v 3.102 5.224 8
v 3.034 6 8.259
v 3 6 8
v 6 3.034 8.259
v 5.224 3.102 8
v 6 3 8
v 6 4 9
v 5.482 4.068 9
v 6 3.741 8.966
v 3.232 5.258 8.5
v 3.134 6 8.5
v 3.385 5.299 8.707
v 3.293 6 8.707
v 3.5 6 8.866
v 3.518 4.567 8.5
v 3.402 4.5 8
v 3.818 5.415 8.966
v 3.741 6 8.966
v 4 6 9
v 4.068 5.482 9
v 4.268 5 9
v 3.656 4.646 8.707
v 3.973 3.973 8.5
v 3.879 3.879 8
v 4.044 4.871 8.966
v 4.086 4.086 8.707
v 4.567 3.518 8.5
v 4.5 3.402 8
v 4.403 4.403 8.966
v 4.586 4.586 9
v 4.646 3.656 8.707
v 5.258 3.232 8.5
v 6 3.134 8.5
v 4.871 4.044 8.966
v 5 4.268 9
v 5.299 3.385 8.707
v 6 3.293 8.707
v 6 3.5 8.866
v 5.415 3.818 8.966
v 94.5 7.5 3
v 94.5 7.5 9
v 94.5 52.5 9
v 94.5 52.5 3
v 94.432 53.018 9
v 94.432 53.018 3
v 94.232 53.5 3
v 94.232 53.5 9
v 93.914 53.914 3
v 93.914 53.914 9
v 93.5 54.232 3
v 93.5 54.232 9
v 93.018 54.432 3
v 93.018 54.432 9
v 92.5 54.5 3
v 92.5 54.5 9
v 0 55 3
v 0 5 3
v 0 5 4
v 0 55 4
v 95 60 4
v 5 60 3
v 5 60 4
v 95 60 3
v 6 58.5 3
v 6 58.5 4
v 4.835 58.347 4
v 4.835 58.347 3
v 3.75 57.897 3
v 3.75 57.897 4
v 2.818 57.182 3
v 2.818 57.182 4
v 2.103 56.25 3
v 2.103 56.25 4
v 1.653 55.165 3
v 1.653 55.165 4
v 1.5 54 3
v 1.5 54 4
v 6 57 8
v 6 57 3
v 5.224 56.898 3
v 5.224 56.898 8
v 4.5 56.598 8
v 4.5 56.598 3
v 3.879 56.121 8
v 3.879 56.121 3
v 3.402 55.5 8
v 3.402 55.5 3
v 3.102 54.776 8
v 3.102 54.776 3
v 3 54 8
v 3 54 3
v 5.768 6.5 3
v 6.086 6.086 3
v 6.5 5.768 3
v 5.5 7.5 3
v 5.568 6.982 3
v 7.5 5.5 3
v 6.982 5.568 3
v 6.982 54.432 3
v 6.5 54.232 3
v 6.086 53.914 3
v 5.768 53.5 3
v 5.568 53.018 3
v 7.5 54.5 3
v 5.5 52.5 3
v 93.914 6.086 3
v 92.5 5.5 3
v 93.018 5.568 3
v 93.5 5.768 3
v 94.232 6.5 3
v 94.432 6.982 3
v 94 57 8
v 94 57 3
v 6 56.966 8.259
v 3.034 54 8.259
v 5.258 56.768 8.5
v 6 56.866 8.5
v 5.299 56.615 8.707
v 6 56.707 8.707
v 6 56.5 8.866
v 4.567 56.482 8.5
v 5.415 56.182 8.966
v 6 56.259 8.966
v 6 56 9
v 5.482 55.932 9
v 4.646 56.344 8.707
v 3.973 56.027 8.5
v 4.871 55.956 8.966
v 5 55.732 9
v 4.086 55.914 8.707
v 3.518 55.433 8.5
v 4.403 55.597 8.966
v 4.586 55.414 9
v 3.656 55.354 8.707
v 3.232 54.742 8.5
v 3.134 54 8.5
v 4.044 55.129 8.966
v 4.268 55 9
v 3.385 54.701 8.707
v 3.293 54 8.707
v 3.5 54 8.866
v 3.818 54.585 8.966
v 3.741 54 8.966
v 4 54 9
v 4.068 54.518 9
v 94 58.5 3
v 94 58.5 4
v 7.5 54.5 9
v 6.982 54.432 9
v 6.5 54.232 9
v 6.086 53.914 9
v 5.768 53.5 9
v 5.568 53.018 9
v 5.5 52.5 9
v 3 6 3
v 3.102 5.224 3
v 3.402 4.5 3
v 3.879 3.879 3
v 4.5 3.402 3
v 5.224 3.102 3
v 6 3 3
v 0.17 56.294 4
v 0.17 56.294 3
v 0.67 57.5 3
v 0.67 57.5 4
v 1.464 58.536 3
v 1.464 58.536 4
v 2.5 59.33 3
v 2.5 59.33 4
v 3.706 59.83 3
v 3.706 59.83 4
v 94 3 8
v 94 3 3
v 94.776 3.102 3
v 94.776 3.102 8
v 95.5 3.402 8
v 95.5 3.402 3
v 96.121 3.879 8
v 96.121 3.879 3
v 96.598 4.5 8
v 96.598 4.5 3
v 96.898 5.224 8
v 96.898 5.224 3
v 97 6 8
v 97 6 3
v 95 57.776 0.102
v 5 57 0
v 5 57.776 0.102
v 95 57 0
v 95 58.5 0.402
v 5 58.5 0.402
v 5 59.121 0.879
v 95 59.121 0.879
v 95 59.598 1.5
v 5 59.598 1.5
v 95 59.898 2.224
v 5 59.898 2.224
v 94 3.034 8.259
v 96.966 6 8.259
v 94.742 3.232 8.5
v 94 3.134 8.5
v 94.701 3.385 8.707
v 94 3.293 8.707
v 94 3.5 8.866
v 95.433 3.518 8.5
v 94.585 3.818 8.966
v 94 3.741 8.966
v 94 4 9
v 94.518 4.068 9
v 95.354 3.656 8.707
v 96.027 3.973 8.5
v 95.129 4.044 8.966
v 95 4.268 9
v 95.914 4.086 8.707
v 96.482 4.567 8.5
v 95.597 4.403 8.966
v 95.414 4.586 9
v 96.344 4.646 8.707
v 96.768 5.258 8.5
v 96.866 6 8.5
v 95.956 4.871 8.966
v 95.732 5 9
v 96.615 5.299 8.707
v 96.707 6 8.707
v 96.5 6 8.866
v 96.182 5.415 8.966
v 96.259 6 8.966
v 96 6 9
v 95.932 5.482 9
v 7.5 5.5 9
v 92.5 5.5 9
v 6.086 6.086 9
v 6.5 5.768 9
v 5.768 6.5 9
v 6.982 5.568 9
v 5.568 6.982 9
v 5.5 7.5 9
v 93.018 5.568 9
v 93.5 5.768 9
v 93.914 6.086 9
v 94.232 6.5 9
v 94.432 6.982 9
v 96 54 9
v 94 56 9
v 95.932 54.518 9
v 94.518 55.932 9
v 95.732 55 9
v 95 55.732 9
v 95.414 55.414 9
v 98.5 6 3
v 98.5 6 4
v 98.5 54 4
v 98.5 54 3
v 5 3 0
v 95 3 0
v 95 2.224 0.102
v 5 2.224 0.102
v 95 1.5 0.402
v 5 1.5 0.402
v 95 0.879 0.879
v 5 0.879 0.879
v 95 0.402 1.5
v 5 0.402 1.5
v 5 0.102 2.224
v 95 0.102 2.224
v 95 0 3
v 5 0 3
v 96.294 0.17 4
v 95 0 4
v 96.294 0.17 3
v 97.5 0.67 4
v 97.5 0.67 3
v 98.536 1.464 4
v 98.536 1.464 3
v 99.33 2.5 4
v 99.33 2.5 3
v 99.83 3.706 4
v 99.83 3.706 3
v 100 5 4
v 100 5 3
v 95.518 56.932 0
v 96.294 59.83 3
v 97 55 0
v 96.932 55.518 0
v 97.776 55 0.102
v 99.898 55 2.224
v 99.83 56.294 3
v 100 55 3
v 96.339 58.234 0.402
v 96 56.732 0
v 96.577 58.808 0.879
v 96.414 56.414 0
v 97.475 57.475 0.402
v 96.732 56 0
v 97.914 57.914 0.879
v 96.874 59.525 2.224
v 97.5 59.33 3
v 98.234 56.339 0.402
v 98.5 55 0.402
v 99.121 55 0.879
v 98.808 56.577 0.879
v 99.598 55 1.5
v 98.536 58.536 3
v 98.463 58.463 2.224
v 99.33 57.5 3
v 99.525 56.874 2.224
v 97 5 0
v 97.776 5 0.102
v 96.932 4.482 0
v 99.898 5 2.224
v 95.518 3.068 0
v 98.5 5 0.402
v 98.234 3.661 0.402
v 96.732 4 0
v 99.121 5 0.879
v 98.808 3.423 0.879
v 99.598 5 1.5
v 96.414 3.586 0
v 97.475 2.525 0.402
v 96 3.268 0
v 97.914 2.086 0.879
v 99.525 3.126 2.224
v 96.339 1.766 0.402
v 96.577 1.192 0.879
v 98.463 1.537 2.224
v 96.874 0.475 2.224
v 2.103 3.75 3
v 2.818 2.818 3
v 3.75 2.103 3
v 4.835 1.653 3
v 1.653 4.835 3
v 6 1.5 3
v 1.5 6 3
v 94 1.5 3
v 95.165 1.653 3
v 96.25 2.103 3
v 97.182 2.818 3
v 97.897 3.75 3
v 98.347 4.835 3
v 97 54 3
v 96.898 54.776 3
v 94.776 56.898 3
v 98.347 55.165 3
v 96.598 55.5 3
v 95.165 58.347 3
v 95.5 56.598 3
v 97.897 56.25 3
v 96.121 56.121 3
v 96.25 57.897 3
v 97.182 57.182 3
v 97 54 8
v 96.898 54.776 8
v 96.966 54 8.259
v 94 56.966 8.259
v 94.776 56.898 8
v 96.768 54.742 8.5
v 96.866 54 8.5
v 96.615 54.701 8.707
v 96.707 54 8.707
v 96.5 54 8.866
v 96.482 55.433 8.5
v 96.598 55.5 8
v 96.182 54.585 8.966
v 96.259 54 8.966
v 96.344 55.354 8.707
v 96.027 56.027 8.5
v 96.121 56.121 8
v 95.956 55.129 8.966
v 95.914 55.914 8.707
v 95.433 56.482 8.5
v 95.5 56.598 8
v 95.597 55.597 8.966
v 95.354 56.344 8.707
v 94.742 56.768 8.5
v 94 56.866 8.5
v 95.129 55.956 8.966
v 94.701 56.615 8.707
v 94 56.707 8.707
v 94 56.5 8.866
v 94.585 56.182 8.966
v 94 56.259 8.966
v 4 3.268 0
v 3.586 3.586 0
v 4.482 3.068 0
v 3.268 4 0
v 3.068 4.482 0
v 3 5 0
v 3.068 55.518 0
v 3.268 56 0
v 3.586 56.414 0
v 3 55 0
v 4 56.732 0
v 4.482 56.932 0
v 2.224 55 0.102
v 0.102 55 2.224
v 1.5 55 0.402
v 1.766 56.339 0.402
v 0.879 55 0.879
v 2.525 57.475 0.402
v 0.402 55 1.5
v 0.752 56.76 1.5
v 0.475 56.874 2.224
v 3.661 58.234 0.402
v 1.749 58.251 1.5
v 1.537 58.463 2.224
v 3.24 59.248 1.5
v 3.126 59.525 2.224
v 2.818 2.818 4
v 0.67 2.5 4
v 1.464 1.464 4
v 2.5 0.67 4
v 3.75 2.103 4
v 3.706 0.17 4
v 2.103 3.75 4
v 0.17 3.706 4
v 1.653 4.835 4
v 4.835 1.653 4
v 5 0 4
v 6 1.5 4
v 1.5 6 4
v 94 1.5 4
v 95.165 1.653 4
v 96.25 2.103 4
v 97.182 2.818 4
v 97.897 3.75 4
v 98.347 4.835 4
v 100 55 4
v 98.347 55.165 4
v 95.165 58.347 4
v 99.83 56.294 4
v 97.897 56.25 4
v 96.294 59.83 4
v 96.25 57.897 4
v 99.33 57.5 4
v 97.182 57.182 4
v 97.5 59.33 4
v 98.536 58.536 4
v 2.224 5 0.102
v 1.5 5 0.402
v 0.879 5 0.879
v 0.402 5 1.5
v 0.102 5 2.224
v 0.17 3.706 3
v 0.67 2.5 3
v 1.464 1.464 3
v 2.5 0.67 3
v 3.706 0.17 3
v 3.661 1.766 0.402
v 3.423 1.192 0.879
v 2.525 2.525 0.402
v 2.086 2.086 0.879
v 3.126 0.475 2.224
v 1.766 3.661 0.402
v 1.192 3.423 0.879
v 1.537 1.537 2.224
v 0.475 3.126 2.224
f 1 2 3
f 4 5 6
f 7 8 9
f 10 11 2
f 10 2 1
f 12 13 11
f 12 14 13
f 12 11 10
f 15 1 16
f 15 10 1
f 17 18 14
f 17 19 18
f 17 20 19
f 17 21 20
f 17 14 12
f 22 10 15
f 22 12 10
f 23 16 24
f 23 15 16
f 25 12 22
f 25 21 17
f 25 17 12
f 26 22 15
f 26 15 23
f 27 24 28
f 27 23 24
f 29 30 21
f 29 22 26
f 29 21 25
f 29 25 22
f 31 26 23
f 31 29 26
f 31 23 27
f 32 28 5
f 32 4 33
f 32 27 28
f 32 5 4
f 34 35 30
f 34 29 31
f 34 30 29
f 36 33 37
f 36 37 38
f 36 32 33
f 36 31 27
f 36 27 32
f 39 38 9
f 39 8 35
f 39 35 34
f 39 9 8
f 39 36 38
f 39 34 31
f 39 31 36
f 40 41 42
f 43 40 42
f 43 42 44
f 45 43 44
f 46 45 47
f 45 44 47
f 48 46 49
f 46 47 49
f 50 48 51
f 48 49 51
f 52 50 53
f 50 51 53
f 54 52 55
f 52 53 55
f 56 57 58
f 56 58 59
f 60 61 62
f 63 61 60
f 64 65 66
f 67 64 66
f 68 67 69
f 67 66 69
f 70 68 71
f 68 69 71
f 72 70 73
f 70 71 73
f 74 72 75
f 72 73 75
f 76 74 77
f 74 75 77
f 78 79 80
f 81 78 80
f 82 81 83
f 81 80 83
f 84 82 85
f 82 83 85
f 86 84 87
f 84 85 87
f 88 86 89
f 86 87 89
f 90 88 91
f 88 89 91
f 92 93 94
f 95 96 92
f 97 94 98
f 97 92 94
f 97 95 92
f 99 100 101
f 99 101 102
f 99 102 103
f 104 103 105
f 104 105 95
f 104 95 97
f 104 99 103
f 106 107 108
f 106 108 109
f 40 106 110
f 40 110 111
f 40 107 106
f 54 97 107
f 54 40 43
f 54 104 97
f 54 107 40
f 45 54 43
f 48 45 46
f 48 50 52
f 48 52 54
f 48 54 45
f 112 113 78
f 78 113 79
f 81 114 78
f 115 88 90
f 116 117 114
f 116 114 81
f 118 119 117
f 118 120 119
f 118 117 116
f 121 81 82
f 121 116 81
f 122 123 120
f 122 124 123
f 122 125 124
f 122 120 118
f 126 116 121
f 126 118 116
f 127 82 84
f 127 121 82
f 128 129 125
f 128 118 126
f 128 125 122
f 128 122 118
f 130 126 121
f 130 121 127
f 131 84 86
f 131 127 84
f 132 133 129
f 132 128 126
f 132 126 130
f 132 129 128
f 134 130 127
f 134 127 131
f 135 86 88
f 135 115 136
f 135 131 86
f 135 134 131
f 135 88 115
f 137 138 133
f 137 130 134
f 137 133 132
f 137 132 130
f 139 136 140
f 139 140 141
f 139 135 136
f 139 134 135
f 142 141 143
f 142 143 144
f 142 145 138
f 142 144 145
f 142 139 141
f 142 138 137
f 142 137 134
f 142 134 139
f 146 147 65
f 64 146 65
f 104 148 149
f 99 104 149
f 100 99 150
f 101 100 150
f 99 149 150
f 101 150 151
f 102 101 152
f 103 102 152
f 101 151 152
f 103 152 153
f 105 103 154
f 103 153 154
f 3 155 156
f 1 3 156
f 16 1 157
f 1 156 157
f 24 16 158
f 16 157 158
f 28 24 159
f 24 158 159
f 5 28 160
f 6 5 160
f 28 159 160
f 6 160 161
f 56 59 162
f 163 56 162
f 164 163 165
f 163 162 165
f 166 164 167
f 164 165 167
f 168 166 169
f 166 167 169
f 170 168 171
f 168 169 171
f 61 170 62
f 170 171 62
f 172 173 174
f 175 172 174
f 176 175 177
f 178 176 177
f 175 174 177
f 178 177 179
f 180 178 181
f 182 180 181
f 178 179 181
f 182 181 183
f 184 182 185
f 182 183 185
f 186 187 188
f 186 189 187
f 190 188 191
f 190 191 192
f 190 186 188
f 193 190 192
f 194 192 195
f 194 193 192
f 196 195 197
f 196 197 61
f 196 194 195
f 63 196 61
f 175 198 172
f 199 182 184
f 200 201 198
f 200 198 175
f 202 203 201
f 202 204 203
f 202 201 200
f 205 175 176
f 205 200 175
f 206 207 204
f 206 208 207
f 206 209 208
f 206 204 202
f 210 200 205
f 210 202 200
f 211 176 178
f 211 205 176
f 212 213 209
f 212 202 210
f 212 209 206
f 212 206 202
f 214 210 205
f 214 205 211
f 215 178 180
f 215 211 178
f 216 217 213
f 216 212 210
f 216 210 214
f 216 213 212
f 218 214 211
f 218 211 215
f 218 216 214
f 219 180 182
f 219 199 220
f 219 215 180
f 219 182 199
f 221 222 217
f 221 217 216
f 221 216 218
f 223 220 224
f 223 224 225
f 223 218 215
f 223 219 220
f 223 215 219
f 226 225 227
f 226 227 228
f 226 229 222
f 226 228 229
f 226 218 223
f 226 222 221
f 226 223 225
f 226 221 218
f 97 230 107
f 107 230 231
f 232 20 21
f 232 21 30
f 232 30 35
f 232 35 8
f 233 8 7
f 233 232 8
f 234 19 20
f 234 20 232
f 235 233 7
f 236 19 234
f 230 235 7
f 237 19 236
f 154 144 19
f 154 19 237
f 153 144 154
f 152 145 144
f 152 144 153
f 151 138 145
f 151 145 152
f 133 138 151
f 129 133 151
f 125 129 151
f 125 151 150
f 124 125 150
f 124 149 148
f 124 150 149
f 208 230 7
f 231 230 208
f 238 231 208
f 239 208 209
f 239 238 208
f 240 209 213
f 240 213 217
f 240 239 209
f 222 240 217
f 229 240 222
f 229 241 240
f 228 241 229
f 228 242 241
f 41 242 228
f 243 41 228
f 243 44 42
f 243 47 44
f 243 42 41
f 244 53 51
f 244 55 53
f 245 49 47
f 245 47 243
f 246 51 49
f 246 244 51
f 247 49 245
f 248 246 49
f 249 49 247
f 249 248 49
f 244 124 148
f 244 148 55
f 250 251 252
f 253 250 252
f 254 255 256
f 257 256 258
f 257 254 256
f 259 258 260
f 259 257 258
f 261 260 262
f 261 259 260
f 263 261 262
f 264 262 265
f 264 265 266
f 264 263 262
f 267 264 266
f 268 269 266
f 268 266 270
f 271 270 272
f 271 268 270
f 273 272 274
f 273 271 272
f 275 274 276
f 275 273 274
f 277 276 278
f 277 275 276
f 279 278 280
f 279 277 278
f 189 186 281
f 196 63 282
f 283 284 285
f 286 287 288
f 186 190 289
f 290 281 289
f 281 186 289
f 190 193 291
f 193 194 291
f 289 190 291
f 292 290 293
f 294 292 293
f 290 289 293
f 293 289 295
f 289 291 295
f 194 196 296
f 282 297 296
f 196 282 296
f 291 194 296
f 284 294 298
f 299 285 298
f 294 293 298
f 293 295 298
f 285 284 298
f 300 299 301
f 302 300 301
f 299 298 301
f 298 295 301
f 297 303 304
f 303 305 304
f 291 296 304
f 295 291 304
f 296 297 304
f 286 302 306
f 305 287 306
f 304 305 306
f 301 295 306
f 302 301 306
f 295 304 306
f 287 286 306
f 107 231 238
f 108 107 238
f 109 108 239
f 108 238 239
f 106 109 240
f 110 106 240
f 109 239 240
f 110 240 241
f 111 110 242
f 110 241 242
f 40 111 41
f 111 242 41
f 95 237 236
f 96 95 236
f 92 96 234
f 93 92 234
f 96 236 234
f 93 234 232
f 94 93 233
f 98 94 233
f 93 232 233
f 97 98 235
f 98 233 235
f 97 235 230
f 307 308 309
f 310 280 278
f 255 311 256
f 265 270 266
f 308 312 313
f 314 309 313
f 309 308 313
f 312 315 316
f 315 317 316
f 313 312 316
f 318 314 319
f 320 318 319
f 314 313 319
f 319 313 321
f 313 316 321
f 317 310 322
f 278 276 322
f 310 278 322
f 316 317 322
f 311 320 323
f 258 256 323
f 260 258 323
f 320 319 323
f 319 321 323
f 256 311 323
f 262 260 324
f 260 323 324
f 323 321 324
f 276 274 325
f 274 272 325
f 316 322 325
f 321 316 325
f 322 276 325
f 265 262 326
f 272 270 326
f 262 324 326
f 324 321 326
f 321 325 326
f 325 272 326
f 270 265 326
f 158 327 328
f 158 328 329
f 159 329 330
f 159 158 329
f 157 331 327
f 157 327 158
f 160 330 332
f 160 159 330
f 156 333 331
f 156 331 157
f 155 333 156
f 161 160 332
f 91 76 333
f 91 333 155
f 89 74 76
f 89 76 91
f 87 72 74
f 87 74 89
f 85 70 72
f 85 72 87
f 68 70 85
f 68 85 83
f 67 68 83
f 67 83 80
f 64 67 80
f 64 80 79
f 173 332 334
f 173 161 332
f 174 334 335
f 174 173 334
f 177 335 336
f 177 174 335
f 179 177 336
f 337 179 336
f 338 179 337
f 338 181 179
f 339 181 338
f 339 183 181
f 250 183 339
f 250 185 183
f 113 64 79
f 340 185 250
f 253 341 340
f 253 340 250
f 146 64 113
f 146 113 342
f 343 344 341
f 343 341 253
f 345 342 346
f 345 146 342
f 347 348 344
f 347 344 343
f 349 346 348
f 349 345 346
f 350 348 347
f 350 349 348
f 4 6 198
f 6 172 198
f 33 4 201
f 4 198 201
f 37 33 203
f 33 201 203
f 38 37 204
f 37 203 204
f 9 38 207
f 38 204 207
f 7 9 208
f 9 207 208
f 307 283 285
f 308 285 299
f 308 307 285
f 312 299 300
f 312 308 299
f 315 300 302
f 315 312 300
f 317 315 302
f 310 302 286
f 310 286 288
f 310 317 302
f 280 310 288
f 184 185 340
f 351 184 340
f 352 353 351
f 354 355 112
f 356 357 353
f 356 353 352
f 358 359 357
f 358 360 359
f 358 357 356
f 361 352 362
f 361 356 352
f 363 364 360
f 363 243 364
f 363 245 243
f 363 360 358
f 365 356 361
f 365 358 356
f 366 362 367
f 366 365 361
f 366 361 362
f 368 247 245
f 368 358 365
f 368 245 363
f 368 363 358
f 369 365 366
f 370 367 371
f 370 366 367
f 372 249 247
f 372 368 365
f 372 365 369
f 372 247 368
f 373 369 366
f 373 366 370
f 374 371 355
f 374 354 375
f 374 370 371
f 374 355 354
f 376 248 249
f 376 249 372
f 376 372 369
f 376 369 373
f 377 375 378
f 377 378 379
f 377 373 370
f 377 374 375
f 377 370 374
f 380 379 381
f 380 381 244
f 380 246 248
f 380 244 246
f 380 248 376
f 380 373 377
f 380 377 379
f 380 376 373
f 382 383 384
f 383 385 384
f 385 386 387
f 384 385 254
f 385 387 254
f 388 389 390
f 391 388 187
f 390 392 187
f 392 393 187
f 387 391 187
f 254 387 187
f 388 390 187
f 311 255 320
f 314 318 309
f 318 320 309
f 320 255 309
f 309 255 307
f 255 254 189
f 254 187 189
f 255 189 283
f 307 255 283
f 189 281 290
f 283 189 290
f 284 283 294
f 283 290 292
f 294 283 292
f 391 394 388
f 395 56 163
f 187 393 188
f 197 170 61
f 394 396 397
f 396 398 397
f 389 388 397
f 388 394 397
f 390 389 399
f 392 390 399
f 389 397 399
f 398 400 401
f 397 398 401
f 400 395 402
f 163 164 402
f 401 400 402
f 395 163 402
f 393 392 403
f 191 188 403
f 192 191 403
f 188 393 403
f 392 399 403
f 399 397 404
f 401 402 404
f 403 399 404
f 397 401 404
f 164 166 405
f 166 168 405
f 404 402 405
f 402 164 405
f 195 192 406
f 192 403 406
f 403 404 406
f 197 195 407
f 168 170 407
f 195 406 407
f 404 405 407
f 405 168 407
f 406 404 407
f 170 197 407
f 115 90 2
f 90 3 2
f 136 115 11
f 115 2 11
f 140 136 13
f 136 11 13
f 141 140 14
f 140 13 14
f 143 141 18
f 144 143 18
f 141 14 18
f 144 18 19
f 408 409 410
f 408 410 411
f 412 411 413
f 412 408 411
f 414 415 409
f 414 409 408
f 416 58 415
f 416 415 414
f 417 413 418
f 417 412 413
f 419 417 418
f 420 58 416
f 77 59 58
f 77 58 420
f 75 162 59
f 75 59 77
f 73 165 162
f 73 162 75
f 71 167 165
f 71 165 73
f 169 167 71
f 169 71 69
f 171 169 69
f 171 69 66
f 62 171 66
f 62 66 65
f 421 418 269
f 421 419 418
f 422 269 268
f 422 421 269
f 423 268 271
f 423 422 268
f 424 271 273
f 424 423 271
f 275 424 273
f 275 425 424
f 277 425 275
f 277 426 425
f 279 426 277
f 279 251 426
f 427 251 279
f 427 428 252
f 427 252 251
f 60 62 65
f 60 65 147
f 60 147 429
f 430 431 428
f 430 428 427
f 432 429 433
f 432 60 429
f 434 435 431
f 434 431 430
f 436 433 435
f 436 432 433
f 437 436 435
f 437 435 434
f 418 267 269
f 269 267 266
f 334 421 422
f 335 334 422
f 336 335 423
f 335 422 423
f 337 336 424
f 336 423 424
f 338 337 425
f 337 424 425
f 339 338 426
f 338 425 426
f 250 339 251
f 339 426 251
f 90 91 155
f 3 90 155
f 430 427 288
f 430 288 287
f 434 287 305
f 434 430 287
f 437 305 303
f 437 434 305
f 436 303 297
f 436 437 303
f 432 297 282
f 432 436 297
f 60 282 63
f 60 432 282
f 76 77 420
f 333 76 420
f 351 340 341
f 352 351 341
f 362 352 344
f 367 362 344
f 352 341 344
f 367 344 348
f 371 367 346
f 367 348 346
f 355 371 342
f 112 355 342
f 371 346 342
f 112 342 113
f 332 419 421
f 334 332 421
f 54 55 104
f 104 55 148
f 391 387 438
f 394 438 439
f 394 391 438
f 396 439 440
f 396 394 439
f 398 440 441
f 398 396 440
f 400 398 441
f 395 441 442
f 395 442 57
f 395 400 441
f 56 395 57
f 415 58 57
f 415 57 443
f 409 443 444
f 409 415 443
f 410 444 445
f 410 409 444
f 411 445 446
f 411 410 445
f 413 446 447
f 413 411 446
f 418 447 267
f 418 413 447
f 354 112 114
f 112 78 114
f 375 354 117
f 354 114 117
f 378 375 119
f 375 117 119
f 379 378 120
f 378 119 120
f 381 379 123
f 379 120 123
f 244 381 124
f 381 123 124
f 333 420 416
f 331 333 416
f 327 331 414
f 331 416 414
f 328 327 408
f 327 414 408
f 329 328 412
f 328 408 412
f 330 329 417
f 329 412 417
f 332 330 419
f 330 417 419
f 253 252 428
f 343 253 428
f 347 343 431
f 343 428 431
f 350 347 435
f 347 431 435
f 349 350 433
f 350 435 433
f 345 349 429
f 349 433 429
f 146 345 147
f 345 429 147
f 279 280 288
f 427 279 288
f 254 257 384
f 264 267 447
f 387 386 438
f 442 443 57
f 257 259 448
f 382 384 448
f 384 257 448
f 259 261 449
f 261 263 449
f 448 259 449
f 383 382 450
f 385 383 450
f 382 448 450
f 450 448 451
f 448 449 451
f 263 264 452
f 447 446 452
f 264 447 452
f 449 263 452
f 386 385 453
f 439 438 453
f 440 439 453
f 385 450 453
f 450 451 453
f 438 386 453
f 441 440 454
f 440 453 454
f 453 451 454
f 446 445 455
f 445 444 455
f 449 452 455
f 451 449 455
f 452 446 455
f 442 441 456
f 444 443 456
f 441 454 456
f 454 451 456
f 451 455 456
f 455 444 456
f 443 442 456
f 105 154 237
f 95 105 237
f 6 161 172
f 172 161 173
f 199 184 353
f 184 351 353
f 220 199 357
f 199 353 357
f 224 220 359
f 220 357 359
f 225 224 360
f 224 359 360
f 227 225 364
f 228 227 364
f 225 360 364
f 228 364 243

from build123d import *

# Parameters (mm, degrees)
SKETCH_W        = 100
SKETCH_H        = 60
PAD_DEPTH       = 4
FILLET_R        = 5
FILLET001_R     = 3
POCKET001_DEPTH = 1
PAD001_DEPTH    = 5
POCKET_DEPTH    = 6
FILLET002_R     = 1


with BuildPart() as part:
    # Sketch → Pad (new body)
    with BuildSketch(Plane.XY):
        with Locations((50, 30)):
            Rectangle(SKETCH_W, SKETCH_H)
    extrude(amount=PAD_DEPTH)

    # Fillet
    fillet_edges = [part.edges().sort_by_distance(p)[0] for p in [
        (100, 0, 2),
        (0, 0, 2),
        (100, 60, 2),
        (0, 60, 2),
    ]]
    fillet(fillet_edges, radius=FILLET_R)

    # Fillet001
    fillet001_edges = [part.edges().sort_by_distance(p)[0] for p in [
        (50, 60, 0),
    ]]
    fillet(fillet001_edges, radius=FILLET001_R)

    # Sketch008 (on Face6 of Pad) → Pocket001 (cut)
    with BuildSketch(Plane.XY.offset(4)):
        with BuildLine():
            Line((6, 1.5), (94, 1.5))
            ThreePointArc((94, 1.5), (97.181981, 2.818019), (98.5, 6))
            Line((98.5, 6), (98.5, 54))
            ThreePointArc((98.5, 54), (97.181981, 57.181981), (94, 58.5))
            Line((94, 58.5), (6, 58.5))
            ThreePointArc((6, 58.5), (2.818019, 57.181981), (1.5, 54))
            Line((1.5, 54), (1.5, 6))
            ThreePointArc((1.5, 6), (2.818019, 2.818019), (6, 1.5))
        make_face()
        with BuildLine():
            Line((6, 3), (94, 3))
            ThreePointArc((94, 3), (96.12132, 3.87868), (97, 6))
            Line((97, 6), (97, 54))
            ThreePointArc((97, 54), (96.12132, 56.12132), (94, 57))
            Line((94, 57), (6, 57))
            ThreePointArc((6, 57), (3.87868, 56.12132), (3, 54))
            Line((3, 54), (3, 6))
            ThreePointArc((3, 6), (3.87868, 3.87868), (6, 3))
        make_face(mode=Mode.SUBTRACT)
    extrude(amount=-POCKET001_DEPTH, mode=Mode.SUBTRACT)

    # Sketch001 (on Face6 of Pad) → Pad001 (join)
    with BuildSketch(Plane.XY.offset(4)):
        with BuildLine():
            Line((6, 3), (94, 3))
            ThreePointArc((94, 3), (96.12132, 3.87868), (97, 6))
            Line((97, 6), (97, 54))
            ThreePointArc((97, 54), (96.12132, 56.12132), (94, 57))
            Line((94, 57), (6, 57))
            ThreePointArc((6, 57), (3.87868, 56.12132), (3, 54))
            Line((3, 54), (3, 6))
            ThreePointArc((3, 6), (3.87868, 3.87868), (6, 3))
        make_face()
    extrude(amount=PAD001_DEPTH)

    # Sketch009 (on Face44 of Pad001) → Pocket (cut)
    with BuildSketch(Plane.XY.offset(9)):
        with BuildLine():
            Line((7.5, 5.5), (92.5, 5.5))
            ThreePointArc((92.5, 5.5), (93.914214, 6.085786), (94.5, 7.5))
            Line((94.5, 7.5), (94.5, 52.5))
            ThreePointArc((94.5, 52.5), (93.914214, 53.914214), (92.5, 54.5))
            Line((92.5, 54.5), (7.5, 54.5))
            ThreePointArc((7.5, 54.5), (6.085786, 53.914214), (5.5, 52.5))
            Line((5.5, 52.5), (5.5, 7.5))
            ThreePointArc((5.5, 7.5), (6.085786, 6.085786), (7.5, 5.5))
        make_face()
    extrude(amount=-POCKET_DEPTH, mode=Mode.SUBTRACT)

    # Fillet002
    fillet002_edges = [part.edges().sort_by_distance(p)[0] for p in [
        (50, 3, 9),
    ]]
    fillet(fillet002_edges, radius=FILLET002_R)


solid = part.part
